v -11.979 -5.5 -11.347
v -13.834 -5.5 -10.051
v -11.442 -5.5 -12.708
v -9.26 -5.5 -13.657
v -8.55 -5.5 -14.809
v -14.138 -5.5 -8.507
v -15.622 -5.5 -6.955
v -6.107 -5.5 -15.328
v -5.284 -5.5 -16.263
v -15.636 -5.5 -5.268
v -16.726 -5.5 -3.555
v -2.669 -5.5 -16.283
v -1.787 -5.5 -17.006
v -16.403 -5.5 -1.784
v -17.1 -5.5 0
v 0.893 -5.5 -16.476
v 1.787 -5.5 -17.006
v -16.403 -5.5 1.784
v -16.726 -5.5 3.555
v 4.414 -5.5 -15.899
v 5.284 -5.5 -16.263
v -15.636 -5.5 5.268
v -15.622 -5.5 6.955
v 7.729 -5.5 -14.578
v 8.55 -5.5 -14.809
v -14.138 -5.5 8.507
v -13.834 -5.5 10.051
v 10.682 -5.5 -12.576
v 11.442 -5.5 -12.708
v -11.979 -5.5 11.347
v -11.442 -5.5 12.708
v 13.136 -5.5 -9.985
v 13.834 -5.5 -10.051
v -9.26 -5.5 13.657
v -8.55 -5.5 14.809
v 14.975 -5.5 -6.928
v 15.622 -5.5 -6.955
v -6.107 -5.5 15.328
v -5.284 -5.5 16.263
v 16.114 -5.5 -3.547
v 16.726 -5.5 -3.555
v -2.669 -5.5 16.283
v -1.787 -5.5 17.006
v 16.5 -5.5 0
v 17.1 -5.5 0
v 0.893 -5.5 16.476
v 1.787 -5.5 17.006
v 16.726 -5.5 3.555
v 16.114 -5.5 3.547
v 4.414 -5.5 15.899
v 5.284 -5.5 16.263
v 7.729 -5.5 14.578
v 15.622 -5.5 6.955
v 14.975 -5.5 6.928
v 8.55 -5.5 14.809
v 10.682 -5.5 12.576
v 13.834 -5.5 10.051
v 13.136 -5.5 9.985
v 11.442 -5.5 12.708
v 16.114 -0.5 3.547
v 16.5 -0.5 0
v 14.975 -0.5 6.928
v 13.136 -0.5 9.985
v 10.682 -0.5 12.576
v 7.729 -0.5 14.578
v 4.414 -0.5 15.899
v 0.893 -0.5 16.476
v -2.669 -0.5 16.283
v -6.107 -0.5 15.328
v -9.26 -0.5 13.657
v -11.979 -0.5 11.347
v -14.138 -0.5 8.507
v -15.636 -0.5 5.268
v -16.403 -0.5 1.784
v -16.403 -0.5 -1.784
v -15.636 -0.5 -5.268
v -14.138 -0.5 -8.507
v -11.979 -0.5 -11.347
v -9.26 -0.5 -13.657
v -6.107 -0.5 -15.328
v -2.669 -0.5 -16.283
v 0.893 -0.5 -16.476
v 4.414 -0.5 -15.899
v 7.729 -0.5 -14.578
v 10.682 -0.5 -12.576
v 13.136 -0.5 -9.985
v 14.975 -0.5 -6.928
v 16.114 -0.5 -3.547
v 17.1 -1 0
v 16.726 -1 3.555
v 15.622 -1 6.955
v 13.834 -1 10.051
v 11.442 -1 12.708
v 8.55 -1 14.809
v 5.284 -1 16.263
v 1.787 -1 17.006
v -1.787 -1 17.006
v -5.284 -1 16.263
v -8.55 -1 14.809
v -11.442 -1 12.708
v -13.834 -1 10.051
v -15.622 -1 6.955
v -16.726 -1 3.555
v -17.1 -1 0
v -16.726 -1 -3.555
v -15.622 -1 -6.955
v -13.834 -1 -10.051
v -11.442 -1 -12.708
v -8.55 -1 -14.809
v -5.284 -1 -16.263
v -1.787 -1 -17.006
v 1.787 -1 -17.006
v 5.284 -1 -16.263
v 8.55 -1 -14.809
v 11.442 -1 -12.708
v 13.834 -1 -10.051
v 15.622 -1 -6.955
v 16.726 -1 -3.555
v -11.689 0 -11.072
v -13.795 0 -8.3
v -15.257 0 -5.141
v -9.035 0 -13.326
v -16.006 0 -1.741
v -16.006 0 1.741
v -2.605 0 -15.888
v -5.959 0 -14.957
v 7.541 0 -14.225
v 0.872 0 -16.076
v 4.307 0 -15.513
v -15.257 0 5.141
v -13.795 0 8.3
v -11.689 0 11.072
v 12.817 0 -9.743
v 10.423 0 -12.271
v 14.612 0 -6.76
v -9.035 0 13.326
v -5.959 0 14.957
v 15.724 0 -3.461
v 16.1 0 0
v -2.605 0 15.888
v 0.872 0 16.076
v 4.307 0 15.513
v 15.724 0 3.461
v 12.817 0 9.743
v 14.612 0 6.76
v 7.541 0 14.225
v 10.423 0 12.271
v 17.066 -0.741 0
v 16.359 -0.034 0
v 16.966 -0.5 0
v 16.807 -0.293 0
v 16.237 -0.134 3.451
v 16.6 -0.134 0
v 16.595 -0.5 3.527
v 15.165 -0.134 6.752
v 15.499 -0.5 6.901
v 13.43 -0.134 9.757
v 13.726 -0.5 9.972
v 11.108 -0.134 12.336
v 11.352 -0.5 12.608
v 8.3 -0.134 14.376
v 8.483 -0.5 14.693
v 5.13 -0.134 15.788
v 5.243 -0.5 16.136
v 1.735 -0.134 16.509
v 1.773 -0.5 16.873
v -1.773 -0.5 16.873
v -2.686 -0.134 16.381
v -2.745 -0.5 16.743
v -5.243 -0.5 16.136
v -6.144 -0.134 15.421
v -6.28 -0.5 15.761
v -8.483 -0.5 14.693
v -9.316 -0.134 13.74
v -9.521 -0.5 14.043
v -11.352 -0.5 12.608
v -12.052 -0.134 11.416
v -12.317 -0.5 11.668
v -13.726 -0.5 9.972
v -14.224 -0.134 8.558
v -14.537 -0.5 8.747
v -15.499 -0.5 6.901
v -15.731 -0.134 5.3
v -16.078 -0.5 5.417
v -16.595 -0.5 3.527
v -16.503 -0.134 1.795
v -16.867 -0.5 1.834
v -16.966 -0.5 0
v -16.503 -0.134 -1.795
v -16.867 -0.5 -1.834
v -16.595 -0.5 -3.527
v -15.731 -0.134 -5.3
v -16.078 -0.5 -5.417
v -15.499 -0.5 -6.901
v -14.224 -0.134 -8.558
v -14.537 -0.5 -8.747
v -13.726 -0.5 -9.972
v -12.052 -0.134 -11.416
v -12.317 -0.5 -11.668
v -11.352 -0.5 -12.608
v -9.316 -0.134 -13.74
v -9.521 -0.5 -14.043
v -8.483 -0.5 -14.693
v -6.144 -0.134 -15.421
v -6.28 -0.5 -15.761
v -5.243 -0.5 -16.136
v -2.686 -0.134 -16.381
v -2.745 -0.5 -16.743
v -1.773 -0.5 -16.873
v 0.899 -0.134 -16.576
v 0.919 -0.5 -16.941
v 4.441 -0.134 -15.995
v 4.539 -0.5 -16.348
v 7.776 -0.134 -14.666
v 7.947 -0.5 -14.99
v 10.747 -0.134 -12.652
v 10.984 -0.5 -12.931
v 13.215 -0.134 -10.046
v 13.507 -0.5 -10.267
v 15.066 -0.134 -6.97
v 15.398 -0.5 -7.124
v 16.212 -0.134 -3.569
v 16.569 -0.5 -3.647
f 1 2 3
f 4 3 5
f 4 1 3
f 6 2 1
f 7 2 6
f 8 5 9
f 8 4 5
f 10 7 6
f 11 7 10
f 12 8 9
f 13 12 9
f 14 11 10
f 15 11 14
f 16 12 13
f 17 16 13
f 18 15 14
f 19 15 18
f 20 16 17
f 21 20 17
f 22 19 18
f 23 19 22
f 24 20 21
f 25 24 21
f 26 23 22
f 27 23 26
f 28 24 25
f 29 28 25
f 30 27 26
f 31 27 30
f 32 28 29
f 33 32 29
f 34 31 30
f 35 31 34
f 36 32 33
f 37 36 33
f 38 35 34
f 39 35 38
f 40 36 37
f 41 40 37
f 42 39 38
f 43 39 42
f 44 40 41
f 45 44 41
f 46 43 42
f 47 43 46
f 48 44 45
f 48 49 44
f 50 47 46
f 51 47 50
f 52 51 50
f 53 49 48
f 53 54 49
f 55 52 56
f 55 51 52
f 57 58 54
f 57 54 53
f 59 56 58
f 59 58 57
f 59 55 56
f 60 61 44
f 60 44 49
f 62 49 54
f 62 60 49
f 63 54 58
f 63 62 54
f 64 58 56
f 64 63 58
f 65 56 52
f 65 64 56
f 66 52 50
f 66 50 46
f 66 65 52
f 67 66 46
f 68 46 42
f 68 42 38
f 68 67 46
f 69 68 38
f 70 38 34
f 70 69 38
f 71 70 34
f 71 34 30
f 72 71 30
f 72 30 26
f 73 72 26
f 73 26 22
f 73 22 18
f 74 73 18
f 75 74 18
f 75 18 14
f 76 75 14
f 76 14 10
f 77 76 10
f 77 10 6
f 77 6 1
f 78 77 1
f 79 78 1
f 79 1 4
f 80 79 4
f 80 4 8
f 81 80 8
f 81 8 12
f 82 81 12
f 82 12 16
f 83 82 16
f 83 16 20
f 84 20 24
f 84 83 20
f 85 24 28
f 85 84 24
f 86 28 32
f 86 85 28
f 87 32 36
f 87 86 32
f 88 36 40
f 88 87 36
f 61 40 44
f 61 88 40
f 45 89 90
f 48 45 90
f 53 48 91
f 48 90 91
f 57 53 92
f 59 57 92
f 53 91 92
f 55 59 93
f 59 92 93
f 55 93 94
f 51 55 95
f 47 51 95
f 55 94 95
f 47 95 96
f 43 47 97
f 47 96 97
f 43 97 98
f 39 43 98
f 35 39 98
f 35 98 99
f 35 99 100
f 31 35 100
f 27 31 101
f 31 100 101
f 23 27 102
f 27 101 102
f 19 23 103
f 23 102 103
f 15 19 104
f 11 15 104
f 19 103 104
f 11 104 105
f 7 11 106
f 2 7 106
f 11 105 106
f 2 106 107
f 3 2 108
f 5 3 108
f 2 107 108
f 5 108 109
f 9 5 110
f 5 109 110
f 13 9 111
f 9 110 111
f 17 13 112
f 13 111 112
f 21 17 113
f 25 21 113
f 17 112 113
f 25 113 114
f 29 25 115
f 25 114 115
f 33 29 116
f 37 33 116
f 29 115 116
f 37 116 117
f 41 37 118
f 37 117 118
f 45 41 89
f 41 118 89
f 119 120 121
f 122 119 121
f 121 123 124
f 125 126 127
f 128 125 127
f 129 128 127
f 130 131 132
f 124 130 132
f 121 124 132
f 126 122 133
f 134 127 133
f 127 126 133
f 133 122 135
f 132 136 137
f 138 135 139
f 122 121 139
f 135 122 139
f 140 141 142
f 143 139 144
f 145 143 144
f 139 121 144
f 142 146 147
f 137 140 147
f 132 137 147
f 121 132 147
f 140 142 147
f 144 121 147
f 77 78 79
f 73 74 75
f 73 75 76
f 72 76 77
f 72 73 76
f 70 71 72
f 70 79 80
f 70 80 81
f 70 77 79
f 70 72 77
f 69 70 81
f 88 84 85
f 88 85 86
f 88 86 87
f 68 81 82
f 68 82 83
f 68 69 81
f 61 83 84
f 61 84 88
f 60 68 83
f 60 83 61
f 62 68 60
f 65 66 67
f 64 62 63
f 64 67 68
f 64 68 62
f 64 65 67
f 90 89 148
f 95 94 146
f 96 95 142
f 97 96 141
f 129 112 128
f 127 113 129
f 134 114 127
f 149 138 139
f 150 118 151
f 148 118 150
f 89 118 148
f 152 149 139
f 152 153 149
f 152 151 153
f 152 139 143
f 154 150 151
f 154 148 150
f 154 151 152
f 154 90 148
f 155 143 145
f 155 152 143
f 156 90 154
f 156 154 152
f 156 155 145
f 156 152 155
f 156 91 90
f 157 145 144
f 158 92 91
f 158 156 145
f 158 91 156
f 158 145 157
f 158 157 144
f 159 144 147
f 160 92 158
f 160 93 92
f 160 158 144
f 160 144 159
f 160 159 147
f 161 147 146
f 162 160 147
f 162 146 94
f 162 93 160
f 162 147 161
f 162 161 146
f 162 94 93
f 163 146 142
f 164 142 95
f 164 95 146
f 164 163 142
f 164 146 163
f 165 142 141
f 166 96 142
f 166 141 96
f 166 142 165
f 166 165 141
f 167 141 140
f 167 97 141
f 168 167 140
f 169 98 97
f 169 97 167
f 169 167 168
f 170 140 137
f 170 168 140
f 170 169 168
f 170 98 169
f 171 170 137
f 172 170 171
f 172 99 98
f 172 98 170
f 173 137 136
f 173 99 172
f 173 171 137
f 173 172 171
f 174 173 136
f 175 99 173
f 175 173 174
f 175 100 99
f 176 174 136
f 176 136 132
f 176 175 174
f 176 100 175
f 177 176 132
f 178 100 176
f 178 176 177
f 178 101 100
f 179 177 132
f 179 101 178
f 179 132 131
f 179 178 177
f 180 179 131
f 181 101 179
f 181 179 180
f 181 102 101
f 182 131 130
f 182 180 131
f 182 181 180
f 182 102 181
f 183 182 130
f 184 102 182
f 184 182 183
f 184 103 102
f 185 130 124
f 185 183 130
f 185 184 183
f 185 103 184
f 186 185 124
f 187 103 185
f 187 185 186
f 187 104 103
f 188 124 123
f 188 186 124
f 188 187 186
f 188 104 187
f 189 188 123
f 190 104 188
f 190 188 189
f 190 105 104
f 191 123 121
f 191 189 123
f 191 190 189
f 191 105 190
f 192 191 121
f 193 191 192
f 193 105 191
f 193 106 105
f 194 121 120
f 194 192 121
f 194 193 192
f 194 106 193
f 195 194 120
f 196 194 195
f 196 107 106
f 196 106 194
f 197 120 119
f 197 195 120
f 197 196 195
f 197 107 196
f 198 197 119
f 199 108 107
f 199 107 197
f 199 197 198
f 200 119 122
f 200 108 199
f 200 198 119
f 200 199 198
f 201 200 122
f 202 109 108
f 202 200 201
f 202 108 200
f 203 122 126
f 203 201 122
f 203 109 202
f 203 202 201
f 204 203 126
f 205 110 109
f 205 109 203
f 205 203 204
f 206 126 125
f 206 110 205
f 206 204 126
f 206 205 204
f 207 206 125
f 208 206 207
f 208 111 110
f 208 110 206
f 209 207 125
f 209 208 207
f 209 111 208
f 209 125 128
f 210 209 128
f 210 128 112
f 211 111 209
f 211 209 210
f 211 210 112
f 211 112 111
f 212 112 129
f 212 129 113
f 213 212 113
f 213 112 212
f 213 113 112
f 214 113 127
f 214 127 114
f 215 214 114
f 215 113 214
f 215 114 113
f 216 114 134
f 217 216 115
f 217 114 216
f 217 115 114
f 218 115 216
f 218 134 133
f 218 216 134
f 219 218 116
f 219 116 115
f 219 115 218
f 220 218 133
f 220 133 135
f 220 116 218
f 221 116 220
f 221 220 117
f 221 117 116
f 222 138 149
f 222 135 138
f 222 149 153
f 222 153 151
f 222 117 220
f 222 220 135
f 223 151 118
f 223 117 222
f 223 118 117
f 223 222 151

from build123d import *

# Parameters (mm, degrees)
F0_R     = 17.1
F0_R_2   = 16.5
F1_DEPTH = 5.5
F2_DEPTH = 0.5
F3_R     = 1


with BuildPart() as f1:
    # F0 (on Front) → F1 (new body)
    with BuildSketch(Plane.XZ):
        Circle(F0_R)
        Circle(F0_R_2, mode=Mode.SUBTRACT)
    extrude(amount=F1_DEPTH)

    # F0 (on Front) → F2 (join)
    with BuildSketch(Plane.XZ):
        Circle(F0_R_2)
    extrude(amount=F2_DEPTH)

    # F3
    f3_edges = [f1.edges().sort_by_distance(p)[0] for p in [
        (-17.1, 0, 0),
    ]]
    fillet(f3_edges, radius=F3_R)


solid = f1.part
